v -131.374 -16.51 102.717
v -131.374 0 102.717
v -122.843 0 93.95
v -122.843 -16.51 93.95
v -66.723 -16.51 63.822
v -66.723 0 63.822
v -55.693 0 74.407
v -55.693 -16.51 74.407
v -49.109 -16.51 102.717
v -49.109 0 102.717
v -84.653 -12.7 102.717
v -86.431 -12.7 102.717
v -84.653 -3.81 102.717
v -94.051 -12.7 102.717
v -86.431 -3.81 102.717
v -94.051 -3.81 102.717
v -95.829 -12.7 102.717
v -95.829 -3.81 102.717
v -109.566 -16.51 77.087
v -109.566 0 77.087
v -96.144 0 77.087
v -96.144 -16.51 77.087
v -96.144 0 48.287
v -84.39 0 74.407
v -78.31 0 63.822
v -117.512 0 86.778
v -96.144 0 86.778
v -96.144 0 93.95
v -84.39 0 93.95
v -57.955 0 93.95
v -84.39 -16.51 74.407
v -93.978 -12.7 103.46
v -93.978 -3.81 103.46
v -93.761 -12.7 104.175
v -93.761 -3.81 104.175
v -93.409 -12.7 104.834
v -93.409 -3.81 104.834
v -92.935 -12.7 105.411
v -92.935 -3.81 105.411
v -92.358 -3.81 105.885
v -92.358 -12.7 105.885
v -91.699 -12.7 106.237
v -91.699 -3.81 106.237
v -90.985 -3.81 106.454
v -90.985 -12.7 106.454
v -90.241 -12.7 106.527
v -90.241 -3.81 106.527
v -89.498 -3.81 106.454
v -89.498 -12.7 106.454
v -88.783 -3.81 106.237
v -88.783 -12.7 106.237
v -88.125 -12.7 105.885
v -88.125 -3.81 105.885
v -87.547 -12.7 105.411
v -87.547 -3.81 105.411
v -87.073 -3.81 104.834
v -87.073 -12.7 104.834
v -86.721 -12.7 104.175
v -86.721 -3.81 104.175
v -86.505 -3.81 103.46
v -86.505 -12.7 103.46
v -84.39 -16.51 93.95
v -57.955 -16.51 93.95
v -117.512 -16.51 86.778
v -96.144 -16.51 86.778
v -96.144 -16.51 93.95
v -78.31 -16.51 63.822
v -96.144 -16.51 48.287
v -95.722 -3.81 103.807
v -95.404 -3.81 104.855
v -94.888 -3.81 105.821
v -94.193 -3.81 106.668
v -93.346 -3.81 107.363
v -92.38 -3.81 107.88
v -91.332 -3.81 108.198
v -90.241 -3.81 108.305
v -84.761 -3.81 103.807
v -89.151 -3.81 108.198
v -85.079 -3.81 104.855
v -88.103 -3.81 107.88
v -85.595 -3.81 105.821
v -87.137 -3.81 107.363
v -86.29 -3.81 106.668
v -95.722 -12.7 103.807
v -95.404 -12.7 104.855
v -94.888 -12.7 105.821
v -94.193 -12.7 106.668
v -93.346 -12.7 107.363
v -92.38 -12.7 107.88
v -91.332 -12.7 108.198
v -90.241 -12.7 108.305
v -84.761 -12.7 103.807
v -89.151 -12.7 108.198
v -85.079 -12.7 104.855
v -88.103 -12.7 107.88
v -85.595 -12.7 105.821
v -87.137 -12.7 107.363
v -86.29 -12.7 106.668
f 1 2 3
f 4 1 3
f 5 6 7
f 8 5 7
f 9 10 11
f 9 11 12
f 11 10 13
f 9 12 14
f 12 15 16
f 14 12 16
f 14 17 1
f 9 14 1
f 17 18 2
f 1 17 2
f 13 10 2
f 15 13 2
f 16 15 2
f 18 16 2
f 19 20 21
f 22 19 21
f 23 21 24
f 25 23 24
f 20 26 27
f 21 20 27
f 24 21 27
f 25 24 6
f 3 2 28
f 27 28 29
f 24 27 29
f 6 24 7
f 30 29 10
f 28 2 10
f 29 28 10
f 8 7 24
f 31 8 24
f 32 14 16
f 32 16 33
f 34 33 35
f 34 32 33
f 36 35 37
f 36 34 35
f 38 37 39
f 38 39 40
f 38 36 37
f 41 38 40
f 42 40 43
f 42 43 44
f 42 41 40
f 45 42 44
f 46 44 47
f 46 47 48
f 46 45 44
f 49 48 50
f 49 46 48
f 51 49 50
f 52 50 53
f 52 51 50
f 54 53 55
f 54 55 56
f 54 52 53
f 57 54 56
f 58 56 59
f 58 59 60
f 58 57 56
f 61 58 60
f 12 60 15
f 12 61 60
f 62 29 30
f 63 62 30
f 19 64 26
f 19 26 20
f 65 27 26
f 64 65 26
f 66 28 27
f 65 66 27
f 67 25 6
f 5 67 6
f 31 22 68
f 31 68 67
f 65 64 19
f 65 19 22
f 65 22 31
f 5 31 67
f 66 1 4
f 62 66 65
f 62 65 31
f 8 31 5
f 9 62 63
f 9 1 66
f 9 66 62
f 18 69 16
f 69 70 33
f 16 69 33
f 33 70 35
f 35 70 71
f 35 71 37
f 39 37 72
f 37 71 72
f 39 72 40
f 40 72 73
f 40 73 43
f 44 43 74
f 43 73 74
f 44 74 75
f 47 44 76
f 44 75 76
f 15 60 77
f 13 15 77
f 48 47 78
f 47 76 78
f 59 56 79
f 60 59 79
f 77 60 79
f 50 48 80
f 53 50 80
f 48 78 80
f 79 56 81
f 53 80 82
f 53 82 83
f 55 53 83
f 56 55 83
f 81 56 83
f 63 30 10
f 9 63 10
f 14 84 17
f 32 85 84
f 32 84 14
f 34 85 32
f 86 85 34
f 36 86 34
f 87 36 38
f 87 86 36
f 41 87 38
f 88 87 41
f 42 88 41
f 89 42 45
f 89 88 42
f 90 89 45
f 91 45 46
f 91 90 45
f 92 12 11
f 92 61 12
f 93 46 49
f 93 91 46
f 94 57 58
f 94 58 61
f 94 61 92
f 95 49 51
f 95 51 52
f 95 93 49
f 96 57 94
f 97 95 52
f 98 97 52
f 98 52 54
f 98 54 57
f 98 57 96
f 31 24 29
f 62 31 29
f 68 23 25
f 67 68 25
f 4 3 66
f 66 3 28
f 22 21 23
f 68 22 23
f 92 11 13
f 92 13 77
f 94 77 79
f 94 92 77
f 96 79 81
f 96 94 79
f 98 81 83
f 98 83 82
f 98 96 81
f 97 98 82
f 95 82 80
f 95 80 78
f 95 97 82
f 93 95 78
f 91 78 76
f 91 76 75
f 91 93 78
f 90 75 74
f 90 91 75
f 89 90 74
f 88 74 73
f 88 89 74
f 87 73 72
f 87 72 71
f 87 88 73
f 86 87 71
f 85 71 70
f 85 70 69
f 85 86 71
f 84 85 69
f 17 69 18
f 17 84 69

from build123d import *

# Parameters (mm, degrees)
F1_DEPTH = 16.51
F3_DEPTH = 12.7
F5_DEPTH = 3.81


with BuildPart() as f1:
    # F0 (on Front) → F1 (new body)
    with BuildSketch(Plane.XZ):
        Polygon((-49.108937, 102.7169), (-131.373763, 102.7169), (-122.843154, 93.950309), (-96.143551, 93.950309), (-96.143551, 86.778201), (-117.512472, 86.778201), (-109.566309, 77.086523), (-96.143551, 77.086523), (-96.143551, 48.287213), (-78.310058, 63.821733), (-66.723436, 63.821733), (-55.69331, 74.407369), (-84.38962, 74.407369), (-84.38962, 93.950309), (-57.955489, 93.950309), align=None)
    extrude(amount=F1_DEPTH)

    # F2 (on face) → F3 (join)
    with BuildSketch(Plane.XZ.offset(16.51)):
        with BuildLine():
            ThreePointArc((-94.05135, 102.7169), (-90.24135, 106.5269), (-86.43135, 102.7169))
            Line((-86.43135, 102.7169), (-84.65335, 102.7169))
            ThreePointArc((-84.65335, 102.7169), (-90.24135, 108.3049), (-95.82935, 102.7169))
            Line((-95.82935, 102.7169), (-94.05135, 102.7169))
        make_face()
    extrude(amount=-F3_DEPTH)

    # F4 (on face) → F5 (cut)
    with BuildSketch(Plane.XZ.offset(16.51)):
        with BuildLine():
            Line((-86.43135, 102.7169), (-84.65335, 102.7169))
            ThreePointArc((-84.65335, 102.7169), (-90.24135, 108.3049), (-95.82935, 102.7169))
            Line((-95.82935, 102.7169), (-94.05135, 102.7169))
            ThreePointArc((-94.05135, 102.7169), (-90.24135, 106.5269), (-86.43135, 102.7169))
        make_face()
    extrude(amount=-F5_DEPTH, mode=Mode.SUBTRACT)


solid = f1.part
